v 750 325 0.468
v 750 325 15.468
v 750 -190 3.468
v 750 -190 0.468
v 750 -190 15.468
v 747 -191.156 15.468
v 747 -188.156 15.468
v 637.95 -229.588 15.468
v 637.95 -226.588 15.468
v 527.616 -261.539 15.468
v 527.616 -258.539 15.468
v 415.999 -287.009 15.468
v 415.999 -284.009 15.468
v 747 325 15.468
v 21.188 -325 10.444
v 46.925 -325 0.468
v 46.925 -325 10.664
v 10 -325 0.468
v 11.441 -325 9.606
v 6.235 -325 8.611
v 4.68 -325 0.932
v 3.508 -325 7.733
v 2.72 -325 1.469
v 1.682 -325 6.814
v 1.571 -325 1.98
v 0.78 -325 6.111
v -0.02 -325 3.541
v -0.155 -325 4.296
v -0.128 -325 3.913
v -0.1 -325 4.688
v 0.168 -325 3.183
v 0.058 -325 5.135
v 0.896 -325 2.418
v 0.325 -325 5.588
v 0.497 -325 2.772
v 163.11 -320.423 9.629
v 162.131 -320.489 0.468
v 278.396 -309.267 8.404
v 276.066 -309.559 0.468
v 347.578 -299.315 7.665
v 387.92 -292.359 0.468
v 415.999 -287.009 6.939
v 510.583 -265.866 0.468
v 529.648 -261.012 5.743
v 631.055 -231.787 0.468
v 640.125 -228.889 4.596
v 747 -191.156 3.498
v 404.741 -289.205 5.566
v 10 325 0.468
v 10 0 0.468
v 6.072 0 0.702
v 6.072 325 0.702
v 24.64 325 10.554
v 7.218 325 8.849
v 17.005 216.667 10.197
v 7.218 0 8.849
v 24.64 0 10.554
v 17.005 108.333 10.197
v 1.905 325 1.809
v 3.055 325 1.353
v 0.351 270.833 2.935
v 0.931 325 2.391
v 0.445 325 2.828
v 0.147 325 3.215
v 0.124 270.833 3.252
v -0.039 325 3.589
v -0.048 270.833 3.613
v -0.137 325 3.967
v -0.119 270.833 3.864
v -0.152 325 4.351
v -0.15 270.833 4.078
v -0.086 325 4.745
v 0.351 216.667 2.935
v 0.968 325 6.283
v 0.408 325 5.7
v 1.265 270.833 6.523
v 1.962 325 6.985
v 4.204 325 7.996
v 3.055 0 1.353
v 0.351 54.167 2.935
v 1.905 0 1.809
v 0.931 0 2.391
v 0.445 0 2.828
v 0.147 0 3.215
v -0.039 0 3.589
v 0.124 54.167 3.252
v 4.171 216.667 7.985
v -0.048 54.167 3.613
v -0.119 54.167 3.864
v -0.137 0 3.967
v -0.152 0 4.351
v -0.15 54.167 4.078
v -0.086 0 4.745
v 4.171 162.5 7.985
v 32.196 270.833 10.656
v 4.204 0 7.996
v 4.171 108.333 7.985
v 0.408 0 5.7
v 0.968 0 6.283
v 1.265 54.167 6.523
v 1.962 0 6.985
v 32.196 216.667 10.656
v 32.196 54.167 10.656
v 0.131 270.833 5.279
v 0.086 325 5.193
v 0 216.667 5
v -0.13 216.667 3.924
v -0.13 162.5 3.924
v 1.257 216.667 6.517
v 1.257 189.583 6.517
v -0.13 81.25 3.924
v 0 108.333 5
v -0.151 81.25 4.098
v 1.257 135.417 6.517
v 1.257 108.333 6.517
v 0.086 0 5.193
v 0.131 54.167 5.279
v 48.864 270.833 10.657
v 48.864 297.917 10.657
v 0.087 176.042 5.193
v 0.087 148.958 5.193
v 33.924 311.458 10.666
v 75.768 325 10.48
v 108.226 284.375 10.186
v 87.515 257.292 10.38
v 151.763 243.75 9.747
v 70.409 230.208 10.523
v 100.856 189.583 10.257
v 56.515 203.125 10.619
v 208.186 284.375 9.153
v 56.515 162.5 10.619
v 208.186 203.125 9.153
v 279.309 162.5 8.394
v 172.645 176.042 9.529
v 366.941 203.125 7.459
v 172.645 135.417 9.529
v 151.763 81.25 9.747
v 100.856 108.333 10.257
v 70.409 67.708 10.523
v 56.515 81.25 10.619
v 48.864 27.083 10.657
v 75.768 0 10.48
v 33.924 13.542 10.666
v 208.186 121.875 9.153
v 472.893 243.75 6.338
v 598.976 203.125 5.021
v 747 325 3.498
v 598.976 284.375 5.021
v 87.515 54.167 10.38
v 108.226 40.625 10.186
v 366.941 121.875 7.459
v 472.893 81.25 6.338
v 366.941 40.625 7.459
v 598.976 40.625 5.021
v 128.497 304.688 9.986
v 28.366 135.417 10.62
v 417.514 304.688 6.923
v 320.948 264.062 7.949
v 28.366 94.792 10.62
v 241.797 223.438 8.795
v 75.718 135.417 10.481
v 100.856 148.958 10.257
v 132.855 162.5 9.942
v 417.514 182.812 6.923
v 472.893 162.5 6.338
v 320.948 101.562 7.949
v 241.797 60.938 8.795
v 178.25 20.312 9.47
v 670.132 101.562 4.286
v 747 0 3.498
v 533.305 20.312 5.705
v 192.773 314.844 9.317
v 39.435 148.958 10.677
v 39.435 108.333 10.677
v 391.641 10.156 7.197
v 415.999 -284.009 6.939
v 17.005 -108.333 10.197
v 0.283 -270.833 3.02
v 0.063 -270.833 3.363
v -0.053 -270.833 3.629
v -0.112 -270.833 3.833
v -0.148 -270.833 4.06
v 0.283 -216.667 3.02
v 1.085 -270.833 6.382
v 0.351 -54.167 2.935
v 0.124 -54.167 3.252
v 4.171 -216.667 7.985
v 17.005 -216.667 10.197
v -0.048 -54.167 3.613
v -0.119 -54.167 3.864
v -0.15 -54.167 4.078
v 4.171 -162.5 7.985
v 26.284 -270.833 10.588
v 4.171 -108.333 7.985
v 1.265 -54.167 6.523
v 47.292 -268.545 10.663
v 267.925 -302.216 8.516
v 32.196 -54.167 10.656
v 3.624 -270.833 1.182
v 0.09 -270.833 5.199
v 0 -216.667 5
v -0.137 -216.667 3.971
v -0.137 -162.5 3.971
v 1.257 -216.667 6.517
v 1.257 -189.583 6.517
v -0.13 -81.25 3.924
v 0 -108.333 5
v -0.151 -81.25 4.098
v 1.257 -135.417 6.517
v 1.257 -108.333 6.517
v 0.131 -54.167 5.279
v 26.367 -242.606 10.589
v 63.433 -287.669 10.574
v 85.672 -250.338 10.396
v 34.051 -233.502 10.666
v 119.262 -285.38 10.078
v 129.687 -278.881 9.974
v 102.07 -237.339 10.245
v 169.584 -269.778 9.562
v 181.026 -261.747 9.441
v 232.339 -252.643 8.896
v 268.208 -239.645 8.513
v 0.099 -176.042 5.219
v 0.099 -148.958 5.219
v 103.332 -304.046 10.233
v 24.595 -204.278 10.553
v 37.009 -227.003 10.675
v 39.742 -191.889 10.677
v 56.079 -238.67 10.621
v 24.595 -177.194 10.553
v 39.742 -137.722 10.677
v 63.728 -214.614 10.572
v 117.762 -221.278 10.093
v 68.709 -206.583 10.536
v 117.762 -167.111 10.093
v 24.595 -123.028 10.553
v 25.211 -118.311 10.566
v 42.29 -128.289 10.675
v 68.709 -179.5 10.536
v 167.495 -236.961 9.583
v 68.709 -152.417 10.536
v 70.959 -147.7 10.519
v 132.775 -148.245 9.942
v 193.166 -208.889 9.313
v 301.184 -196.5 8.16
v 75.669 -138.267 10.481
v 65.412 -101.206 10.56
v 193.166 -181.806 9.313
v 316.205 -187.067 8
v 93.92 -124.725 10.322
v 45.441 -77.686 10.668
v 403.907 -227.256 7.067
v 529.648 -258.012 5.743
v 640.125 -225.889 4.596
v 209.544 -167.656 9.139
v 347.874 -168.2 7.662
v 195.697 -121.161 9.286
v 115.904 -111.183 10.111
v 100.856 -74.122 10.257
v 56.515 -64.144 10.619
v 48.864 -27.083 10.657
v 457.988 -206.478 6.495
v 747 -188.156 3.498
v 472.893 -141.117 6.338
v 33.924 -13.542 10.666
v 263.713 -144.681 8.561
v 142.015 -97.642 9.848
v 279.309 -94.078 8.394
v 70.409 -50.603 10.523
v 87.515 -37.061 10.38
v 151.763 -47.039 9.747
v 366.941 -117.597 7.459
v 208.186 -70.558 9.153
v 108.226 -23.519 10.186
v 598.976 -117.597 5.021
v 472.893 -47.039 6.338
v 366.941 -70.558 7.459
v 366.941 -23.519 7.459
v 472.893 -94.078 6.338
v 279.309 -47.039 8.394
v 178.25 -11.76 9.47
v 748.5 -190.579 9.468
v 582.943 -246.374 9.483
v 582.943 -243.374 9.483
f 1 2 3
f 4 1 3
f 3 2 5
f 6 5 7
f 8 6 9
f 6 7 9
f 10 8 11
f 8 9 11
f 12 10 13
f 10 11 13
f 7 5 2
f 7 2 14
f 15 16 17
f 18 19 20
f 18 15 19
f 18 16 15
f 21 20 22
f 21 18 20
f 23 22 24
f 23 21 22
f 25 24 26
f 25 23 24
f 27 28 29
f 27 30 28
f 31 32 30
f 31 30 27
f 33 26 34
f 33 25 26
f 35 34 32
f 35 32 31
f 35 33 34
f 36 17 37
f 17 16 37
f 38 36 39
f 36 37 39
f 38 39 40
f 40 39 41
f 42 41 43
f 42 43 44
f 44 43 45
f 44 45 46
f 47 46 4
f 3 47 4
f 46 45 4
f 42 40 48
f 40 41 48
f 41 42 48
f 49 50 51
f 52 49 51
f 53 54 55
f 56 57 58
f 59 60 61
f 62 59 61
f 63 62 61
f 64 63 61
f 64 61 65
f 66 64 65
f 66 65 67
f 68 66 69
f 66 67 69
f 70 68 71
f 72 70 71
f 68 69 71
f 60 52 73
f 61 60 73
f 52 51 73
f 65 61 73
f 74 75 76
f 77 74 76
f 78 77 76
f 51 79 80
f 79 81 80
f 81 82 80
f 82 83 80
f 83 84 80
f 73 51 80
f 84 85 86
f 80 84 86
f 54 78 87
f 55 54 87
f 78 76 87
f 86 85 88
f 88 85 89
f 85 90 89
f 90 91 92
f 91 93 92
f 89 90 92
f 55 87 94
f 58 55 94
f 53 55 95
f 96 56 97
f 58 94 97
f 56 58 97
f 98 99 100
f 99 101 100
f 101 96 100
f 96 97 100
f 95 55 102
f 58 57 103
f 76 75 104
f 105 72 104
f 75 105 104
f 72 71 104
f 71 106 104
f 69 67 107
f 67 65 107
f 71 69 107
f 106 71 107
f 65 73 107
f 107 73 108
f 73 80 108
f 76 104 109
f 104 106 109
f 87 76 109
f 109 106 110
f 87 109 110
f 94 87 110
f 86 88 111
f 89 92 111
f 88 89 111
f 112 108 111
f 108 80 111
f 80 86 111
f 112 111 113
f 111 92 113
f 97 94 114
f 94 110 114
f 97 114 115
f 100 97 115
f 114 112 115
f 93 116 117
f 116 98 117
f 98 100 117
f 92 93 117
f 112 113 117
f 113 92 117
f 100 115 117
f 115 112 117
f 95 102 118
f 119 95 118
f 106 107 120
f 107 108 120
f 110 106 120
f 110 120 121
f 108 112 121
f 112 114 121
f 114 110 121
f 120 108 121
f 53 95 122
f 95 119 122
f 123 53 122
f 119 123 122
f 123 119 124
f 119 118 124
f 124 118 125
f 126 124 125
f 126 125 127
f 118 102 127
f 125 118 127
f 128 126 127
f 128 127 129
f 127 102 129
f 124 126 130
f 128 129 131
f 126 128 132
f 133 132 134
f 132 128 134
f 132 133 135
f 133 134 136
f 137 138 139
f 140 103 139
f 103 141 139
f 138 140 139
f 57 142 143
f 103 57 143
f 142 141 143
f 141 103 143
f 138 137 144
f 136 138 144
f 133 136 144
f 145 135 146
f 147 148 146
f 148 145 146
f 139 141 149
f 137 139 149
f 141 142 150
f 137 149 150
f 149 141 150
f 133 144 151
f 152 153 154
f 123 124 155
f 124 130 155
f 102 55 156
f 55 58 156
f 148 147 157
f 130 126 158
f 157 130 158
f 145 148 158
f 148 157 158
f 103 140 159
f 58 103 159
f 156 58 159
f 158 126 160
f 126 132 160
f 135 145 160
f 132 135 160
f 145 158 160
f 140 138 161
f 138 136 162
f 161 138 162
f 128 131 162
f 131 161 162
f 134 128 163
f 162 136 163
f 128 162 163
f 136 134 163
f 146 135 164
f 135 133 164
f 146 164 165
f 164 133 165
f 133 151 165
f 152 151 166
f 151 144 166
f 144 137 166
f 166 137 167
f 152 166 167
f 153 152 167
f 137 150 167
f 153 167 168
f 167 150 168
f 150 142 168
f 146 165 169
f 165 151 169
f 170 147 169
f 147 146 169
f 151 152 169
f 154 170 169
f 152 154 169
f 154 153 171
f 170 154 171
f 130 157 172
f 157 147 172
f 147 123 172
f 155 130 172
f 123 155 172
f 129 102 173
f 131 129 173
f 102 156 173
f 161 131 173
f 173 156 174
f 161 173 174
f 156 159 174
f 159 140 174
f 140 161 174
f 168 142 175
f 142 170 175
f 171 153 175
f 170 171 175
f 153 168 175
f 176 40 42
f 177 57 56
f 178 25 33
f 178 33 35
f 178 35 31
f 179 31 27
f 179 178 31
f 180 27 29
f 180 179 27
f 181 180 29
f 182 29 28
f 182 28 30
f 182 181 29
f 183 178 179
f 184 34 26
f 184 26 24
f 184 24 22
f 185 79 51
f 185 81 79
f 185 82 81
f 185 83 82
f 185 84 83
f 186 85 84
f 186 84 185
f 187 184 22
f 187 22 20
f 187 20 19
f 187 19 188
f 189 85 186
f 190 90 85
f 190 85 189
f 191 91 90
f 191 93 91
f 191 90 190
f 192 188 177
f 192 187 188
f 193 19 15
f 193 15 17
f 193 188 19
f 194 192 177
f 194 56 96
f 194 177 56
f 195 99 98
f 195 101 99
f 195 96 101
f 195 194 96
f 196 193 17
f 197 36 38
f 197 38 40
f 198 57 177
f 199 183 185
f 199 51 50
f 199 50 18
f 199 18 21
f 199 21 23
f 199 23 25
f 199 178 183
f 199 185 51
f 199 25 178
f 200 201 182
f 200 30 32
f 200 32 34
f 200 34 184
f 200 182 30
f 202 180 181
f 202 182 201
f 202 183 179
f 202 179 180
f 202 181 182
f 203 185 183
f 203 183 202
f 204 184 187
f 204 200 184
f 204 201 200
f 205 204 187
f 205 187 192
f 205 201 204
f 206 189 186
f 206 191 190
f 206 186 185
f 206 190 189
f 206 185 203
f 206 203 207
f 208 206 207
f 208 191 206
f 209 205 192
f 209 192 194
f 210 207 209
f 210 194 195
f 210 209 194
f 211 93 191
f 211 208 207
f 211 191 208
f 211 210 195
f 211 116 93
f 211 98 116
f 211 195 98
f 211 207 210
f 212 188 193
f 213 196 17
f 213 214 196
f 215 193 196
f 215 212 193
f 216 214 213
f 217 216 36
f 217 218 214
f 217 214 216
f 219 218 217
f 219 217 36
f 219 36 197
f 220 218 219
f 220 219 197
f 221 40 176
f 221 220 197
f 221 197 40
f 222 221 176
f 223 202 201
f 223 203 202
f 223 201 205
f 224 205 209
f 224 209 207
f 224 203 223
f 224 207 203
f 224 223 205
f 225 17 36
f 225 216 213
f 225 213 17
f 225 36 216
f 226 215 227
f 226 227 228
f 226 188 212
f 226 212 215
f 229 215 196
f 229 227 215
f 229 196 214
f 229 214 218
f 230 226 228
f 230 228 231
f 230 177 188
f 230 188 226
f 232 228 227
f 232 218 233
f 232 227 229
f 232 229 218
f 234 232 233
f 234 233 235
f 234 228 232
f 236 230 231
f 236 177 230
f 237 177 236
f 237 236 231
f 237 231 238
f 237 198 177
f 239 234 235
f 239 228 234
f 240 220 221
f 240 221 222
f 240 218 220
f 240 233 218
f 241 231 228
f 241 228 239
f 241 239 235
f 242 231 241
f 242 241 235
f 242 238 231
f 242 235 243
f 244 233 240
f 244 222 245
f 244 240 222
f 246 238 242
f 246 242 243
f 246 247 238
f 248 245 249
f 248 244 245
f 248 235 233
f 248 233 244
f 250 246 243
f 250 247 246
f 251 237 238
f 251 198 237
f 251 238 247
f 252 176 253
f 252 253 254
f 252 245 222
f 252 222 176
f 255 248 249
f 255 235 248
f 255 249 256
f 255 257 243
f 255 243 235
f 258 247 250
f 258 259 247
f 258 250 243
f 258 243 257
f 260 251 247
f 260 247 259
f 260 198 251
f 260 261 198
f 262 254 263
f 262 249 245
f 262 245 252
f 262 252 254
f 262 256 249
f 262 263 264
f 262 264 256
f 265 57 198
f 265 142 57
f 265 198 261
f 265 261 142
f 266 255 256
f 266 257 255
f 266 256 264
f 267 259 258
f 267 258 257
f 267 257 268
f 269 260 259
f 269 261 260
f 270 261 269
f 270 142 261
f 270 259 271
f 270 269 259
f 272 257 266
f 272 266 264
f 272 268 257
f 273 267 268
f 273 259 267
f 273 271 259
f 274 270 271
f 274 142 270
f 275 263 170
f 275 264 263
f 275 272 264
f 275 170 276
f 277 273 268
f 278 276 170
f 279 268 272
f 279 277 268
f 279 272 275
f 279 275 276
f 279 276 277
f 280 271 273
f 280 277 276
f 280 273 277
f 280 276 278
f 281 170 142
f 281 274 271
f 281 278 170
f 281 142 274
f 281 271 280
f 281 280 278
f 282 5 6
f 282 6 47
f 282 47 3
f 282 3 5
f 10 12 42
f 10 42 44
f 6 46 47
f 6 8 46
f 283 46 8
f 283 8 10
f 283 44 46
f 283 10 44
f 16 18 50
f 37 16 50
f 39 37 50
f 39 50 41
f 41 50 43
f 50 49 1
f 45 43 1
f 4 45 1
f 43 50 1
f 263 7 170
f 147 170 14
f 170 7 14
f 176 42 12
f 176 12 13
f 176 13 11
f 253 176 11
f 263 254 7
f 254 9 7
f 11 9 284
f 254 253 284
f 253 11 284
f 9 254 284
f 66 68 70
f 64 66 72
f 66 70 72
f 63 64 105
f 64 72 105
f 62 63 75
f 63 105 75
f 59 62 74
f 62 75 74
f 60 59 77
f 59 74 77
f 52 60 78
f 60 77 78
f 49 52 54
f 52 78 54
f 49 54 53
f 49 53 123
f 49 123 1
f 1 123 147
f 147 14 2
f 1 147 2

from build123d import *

# Parameters (mm, degrees)
EXTRUDE_1_DEPTH     = 325
CUT_EXTRUDE_START   = 0.467643307
CUT_EXTRUDE_1_DEPTH = 10.196163133
EXTRUDE_2_REACH     = 819.527
EXTRUDE_3_REACH     = 819.527


# Read off the part's stored shape, not the designer's step: 切除-拉伸1
with BuildPart() as part:
    # 草图1 → 凸台-拉伸1 (new, symmetric)
    with BuildSketch(Plane(origin=(0, 0, 0), x_dir=(1, 0, 0), z_dir=(0, 1, 0))):
        with BuildLine():
            Line((10, -0.467643307), (750, -0.467643307))
            Line((750, -0.467643307), (750, -3.467643307))
            add(Edge.make_bspline(
                [(10, -0.467643307), (2.716217609, -0.467643307), (-3.977358646, -4.217262467), (9.876528594, -12.267556836), (65.835750945, -10.451699609), (750, -3.467643307)],
                knots=[0, 0, 0, 0, 0.344535258, 0.623371845, 1, 1, 1, 1], degree=3))
        make_face()
    extrude(amount=EXTRUDE_1_DEPTH, both=True)

    # 切除-拉伸1 outline → 切除-拉伸1 (cut)
    with BuildSketch(Plane.XY.offset(CUT_EXTRUDE_START)):
        with BuildLine():
            add(Edge.make_bspline(
                [(46.925011271, -325), (411.018834777, -320.909352671), (750, -190)],
                knots=[0.060602183, 0.060602183, 0.060602183, 1, 1, 1], degree=2))
            Line((46.925011271, -325), (750, -325))
            Line((750, -325), (750, -190))
        make_face()
    extrude(amount=CUT_EXTRUDE_1_DEPTH, mode=Mode.SUBTRACT)

    # 草图3 → 凸台-拉伸2 (add, up to next)
    with BuildSketch(Plane(origin=(0, 0, 15.467643307), x_dir=(-1, 0, 0), z_dir=(0, 0, -1)), mode=Mode.PRIVATE) as extrude_2_sk1:
        with BuildLine():
            Line((-750, 325), (-750, -190))
            add(Edge.make_bspline(
                [(-747, -191.155881977), (-748.500245783, -190.57918219), (-750, -190)],
                knots=[0, 0, 0, 1, 1, 1], degree=2))
            Line((-747, -191.155881977), (-747, 325))
            Line((-747, 325), (-750, 325))
        make_face()
    extrude_2_tool1 = extrude(extrude_2_sk1.sketch, amount=EXTRUDE_2_REACH, mode=Mode.PRIVATE) - part.part
    add(extrude_2_tool1.solids().sort_by_distance((748.49944, 67.210699, 15.467643))[0])

    # 草图4 → 凸台-拉伸3 (add, up to next)
    with BuildSketch(Plane(origin=(0, 0, 15.467643307), x_dir=(-1, 0, 0), z_dir=(0, 0, -1)), mode=Mode.PRIVATE) as extrude_3_sk1:
        with BuildLine():
            Line((-415.998579589, -287.009213098), (-415.998579589, -284.009213098))
            add(Edge.make_bspline(
                [(-415.998579589, -284.009213098), (-584.386896167, -250.664934415), (-747.000000045, -188.15588196)],
                knots=[0.518314736, 0.518314736, 0.518314736, 1, 1, 1], degree=2))
            Line((-747.000000045, -188.15588196), (-747.000000045, -191.15588196))
            add(Edge.make_bspline(
                [(-415.998579589, -287.009213098), (-584.386896167, -253.664934415), (-747.000000045, -191.15588196)],
                knots=[0.518314736, 0.518314736, 0.518314736, 1, 1, 1], degree=2))
        make_face()
    extrude_3_tool1 = extrude(extrude_3_sk1.sketch, amount=EXTRUDE_3_REACH, mode=Mode.PRIVATE) - part.part
    add(extrude_3_tool1.solids().sort_by_distance((583.461704, -245.863812, 15.467643))[0])


solid = part.part
